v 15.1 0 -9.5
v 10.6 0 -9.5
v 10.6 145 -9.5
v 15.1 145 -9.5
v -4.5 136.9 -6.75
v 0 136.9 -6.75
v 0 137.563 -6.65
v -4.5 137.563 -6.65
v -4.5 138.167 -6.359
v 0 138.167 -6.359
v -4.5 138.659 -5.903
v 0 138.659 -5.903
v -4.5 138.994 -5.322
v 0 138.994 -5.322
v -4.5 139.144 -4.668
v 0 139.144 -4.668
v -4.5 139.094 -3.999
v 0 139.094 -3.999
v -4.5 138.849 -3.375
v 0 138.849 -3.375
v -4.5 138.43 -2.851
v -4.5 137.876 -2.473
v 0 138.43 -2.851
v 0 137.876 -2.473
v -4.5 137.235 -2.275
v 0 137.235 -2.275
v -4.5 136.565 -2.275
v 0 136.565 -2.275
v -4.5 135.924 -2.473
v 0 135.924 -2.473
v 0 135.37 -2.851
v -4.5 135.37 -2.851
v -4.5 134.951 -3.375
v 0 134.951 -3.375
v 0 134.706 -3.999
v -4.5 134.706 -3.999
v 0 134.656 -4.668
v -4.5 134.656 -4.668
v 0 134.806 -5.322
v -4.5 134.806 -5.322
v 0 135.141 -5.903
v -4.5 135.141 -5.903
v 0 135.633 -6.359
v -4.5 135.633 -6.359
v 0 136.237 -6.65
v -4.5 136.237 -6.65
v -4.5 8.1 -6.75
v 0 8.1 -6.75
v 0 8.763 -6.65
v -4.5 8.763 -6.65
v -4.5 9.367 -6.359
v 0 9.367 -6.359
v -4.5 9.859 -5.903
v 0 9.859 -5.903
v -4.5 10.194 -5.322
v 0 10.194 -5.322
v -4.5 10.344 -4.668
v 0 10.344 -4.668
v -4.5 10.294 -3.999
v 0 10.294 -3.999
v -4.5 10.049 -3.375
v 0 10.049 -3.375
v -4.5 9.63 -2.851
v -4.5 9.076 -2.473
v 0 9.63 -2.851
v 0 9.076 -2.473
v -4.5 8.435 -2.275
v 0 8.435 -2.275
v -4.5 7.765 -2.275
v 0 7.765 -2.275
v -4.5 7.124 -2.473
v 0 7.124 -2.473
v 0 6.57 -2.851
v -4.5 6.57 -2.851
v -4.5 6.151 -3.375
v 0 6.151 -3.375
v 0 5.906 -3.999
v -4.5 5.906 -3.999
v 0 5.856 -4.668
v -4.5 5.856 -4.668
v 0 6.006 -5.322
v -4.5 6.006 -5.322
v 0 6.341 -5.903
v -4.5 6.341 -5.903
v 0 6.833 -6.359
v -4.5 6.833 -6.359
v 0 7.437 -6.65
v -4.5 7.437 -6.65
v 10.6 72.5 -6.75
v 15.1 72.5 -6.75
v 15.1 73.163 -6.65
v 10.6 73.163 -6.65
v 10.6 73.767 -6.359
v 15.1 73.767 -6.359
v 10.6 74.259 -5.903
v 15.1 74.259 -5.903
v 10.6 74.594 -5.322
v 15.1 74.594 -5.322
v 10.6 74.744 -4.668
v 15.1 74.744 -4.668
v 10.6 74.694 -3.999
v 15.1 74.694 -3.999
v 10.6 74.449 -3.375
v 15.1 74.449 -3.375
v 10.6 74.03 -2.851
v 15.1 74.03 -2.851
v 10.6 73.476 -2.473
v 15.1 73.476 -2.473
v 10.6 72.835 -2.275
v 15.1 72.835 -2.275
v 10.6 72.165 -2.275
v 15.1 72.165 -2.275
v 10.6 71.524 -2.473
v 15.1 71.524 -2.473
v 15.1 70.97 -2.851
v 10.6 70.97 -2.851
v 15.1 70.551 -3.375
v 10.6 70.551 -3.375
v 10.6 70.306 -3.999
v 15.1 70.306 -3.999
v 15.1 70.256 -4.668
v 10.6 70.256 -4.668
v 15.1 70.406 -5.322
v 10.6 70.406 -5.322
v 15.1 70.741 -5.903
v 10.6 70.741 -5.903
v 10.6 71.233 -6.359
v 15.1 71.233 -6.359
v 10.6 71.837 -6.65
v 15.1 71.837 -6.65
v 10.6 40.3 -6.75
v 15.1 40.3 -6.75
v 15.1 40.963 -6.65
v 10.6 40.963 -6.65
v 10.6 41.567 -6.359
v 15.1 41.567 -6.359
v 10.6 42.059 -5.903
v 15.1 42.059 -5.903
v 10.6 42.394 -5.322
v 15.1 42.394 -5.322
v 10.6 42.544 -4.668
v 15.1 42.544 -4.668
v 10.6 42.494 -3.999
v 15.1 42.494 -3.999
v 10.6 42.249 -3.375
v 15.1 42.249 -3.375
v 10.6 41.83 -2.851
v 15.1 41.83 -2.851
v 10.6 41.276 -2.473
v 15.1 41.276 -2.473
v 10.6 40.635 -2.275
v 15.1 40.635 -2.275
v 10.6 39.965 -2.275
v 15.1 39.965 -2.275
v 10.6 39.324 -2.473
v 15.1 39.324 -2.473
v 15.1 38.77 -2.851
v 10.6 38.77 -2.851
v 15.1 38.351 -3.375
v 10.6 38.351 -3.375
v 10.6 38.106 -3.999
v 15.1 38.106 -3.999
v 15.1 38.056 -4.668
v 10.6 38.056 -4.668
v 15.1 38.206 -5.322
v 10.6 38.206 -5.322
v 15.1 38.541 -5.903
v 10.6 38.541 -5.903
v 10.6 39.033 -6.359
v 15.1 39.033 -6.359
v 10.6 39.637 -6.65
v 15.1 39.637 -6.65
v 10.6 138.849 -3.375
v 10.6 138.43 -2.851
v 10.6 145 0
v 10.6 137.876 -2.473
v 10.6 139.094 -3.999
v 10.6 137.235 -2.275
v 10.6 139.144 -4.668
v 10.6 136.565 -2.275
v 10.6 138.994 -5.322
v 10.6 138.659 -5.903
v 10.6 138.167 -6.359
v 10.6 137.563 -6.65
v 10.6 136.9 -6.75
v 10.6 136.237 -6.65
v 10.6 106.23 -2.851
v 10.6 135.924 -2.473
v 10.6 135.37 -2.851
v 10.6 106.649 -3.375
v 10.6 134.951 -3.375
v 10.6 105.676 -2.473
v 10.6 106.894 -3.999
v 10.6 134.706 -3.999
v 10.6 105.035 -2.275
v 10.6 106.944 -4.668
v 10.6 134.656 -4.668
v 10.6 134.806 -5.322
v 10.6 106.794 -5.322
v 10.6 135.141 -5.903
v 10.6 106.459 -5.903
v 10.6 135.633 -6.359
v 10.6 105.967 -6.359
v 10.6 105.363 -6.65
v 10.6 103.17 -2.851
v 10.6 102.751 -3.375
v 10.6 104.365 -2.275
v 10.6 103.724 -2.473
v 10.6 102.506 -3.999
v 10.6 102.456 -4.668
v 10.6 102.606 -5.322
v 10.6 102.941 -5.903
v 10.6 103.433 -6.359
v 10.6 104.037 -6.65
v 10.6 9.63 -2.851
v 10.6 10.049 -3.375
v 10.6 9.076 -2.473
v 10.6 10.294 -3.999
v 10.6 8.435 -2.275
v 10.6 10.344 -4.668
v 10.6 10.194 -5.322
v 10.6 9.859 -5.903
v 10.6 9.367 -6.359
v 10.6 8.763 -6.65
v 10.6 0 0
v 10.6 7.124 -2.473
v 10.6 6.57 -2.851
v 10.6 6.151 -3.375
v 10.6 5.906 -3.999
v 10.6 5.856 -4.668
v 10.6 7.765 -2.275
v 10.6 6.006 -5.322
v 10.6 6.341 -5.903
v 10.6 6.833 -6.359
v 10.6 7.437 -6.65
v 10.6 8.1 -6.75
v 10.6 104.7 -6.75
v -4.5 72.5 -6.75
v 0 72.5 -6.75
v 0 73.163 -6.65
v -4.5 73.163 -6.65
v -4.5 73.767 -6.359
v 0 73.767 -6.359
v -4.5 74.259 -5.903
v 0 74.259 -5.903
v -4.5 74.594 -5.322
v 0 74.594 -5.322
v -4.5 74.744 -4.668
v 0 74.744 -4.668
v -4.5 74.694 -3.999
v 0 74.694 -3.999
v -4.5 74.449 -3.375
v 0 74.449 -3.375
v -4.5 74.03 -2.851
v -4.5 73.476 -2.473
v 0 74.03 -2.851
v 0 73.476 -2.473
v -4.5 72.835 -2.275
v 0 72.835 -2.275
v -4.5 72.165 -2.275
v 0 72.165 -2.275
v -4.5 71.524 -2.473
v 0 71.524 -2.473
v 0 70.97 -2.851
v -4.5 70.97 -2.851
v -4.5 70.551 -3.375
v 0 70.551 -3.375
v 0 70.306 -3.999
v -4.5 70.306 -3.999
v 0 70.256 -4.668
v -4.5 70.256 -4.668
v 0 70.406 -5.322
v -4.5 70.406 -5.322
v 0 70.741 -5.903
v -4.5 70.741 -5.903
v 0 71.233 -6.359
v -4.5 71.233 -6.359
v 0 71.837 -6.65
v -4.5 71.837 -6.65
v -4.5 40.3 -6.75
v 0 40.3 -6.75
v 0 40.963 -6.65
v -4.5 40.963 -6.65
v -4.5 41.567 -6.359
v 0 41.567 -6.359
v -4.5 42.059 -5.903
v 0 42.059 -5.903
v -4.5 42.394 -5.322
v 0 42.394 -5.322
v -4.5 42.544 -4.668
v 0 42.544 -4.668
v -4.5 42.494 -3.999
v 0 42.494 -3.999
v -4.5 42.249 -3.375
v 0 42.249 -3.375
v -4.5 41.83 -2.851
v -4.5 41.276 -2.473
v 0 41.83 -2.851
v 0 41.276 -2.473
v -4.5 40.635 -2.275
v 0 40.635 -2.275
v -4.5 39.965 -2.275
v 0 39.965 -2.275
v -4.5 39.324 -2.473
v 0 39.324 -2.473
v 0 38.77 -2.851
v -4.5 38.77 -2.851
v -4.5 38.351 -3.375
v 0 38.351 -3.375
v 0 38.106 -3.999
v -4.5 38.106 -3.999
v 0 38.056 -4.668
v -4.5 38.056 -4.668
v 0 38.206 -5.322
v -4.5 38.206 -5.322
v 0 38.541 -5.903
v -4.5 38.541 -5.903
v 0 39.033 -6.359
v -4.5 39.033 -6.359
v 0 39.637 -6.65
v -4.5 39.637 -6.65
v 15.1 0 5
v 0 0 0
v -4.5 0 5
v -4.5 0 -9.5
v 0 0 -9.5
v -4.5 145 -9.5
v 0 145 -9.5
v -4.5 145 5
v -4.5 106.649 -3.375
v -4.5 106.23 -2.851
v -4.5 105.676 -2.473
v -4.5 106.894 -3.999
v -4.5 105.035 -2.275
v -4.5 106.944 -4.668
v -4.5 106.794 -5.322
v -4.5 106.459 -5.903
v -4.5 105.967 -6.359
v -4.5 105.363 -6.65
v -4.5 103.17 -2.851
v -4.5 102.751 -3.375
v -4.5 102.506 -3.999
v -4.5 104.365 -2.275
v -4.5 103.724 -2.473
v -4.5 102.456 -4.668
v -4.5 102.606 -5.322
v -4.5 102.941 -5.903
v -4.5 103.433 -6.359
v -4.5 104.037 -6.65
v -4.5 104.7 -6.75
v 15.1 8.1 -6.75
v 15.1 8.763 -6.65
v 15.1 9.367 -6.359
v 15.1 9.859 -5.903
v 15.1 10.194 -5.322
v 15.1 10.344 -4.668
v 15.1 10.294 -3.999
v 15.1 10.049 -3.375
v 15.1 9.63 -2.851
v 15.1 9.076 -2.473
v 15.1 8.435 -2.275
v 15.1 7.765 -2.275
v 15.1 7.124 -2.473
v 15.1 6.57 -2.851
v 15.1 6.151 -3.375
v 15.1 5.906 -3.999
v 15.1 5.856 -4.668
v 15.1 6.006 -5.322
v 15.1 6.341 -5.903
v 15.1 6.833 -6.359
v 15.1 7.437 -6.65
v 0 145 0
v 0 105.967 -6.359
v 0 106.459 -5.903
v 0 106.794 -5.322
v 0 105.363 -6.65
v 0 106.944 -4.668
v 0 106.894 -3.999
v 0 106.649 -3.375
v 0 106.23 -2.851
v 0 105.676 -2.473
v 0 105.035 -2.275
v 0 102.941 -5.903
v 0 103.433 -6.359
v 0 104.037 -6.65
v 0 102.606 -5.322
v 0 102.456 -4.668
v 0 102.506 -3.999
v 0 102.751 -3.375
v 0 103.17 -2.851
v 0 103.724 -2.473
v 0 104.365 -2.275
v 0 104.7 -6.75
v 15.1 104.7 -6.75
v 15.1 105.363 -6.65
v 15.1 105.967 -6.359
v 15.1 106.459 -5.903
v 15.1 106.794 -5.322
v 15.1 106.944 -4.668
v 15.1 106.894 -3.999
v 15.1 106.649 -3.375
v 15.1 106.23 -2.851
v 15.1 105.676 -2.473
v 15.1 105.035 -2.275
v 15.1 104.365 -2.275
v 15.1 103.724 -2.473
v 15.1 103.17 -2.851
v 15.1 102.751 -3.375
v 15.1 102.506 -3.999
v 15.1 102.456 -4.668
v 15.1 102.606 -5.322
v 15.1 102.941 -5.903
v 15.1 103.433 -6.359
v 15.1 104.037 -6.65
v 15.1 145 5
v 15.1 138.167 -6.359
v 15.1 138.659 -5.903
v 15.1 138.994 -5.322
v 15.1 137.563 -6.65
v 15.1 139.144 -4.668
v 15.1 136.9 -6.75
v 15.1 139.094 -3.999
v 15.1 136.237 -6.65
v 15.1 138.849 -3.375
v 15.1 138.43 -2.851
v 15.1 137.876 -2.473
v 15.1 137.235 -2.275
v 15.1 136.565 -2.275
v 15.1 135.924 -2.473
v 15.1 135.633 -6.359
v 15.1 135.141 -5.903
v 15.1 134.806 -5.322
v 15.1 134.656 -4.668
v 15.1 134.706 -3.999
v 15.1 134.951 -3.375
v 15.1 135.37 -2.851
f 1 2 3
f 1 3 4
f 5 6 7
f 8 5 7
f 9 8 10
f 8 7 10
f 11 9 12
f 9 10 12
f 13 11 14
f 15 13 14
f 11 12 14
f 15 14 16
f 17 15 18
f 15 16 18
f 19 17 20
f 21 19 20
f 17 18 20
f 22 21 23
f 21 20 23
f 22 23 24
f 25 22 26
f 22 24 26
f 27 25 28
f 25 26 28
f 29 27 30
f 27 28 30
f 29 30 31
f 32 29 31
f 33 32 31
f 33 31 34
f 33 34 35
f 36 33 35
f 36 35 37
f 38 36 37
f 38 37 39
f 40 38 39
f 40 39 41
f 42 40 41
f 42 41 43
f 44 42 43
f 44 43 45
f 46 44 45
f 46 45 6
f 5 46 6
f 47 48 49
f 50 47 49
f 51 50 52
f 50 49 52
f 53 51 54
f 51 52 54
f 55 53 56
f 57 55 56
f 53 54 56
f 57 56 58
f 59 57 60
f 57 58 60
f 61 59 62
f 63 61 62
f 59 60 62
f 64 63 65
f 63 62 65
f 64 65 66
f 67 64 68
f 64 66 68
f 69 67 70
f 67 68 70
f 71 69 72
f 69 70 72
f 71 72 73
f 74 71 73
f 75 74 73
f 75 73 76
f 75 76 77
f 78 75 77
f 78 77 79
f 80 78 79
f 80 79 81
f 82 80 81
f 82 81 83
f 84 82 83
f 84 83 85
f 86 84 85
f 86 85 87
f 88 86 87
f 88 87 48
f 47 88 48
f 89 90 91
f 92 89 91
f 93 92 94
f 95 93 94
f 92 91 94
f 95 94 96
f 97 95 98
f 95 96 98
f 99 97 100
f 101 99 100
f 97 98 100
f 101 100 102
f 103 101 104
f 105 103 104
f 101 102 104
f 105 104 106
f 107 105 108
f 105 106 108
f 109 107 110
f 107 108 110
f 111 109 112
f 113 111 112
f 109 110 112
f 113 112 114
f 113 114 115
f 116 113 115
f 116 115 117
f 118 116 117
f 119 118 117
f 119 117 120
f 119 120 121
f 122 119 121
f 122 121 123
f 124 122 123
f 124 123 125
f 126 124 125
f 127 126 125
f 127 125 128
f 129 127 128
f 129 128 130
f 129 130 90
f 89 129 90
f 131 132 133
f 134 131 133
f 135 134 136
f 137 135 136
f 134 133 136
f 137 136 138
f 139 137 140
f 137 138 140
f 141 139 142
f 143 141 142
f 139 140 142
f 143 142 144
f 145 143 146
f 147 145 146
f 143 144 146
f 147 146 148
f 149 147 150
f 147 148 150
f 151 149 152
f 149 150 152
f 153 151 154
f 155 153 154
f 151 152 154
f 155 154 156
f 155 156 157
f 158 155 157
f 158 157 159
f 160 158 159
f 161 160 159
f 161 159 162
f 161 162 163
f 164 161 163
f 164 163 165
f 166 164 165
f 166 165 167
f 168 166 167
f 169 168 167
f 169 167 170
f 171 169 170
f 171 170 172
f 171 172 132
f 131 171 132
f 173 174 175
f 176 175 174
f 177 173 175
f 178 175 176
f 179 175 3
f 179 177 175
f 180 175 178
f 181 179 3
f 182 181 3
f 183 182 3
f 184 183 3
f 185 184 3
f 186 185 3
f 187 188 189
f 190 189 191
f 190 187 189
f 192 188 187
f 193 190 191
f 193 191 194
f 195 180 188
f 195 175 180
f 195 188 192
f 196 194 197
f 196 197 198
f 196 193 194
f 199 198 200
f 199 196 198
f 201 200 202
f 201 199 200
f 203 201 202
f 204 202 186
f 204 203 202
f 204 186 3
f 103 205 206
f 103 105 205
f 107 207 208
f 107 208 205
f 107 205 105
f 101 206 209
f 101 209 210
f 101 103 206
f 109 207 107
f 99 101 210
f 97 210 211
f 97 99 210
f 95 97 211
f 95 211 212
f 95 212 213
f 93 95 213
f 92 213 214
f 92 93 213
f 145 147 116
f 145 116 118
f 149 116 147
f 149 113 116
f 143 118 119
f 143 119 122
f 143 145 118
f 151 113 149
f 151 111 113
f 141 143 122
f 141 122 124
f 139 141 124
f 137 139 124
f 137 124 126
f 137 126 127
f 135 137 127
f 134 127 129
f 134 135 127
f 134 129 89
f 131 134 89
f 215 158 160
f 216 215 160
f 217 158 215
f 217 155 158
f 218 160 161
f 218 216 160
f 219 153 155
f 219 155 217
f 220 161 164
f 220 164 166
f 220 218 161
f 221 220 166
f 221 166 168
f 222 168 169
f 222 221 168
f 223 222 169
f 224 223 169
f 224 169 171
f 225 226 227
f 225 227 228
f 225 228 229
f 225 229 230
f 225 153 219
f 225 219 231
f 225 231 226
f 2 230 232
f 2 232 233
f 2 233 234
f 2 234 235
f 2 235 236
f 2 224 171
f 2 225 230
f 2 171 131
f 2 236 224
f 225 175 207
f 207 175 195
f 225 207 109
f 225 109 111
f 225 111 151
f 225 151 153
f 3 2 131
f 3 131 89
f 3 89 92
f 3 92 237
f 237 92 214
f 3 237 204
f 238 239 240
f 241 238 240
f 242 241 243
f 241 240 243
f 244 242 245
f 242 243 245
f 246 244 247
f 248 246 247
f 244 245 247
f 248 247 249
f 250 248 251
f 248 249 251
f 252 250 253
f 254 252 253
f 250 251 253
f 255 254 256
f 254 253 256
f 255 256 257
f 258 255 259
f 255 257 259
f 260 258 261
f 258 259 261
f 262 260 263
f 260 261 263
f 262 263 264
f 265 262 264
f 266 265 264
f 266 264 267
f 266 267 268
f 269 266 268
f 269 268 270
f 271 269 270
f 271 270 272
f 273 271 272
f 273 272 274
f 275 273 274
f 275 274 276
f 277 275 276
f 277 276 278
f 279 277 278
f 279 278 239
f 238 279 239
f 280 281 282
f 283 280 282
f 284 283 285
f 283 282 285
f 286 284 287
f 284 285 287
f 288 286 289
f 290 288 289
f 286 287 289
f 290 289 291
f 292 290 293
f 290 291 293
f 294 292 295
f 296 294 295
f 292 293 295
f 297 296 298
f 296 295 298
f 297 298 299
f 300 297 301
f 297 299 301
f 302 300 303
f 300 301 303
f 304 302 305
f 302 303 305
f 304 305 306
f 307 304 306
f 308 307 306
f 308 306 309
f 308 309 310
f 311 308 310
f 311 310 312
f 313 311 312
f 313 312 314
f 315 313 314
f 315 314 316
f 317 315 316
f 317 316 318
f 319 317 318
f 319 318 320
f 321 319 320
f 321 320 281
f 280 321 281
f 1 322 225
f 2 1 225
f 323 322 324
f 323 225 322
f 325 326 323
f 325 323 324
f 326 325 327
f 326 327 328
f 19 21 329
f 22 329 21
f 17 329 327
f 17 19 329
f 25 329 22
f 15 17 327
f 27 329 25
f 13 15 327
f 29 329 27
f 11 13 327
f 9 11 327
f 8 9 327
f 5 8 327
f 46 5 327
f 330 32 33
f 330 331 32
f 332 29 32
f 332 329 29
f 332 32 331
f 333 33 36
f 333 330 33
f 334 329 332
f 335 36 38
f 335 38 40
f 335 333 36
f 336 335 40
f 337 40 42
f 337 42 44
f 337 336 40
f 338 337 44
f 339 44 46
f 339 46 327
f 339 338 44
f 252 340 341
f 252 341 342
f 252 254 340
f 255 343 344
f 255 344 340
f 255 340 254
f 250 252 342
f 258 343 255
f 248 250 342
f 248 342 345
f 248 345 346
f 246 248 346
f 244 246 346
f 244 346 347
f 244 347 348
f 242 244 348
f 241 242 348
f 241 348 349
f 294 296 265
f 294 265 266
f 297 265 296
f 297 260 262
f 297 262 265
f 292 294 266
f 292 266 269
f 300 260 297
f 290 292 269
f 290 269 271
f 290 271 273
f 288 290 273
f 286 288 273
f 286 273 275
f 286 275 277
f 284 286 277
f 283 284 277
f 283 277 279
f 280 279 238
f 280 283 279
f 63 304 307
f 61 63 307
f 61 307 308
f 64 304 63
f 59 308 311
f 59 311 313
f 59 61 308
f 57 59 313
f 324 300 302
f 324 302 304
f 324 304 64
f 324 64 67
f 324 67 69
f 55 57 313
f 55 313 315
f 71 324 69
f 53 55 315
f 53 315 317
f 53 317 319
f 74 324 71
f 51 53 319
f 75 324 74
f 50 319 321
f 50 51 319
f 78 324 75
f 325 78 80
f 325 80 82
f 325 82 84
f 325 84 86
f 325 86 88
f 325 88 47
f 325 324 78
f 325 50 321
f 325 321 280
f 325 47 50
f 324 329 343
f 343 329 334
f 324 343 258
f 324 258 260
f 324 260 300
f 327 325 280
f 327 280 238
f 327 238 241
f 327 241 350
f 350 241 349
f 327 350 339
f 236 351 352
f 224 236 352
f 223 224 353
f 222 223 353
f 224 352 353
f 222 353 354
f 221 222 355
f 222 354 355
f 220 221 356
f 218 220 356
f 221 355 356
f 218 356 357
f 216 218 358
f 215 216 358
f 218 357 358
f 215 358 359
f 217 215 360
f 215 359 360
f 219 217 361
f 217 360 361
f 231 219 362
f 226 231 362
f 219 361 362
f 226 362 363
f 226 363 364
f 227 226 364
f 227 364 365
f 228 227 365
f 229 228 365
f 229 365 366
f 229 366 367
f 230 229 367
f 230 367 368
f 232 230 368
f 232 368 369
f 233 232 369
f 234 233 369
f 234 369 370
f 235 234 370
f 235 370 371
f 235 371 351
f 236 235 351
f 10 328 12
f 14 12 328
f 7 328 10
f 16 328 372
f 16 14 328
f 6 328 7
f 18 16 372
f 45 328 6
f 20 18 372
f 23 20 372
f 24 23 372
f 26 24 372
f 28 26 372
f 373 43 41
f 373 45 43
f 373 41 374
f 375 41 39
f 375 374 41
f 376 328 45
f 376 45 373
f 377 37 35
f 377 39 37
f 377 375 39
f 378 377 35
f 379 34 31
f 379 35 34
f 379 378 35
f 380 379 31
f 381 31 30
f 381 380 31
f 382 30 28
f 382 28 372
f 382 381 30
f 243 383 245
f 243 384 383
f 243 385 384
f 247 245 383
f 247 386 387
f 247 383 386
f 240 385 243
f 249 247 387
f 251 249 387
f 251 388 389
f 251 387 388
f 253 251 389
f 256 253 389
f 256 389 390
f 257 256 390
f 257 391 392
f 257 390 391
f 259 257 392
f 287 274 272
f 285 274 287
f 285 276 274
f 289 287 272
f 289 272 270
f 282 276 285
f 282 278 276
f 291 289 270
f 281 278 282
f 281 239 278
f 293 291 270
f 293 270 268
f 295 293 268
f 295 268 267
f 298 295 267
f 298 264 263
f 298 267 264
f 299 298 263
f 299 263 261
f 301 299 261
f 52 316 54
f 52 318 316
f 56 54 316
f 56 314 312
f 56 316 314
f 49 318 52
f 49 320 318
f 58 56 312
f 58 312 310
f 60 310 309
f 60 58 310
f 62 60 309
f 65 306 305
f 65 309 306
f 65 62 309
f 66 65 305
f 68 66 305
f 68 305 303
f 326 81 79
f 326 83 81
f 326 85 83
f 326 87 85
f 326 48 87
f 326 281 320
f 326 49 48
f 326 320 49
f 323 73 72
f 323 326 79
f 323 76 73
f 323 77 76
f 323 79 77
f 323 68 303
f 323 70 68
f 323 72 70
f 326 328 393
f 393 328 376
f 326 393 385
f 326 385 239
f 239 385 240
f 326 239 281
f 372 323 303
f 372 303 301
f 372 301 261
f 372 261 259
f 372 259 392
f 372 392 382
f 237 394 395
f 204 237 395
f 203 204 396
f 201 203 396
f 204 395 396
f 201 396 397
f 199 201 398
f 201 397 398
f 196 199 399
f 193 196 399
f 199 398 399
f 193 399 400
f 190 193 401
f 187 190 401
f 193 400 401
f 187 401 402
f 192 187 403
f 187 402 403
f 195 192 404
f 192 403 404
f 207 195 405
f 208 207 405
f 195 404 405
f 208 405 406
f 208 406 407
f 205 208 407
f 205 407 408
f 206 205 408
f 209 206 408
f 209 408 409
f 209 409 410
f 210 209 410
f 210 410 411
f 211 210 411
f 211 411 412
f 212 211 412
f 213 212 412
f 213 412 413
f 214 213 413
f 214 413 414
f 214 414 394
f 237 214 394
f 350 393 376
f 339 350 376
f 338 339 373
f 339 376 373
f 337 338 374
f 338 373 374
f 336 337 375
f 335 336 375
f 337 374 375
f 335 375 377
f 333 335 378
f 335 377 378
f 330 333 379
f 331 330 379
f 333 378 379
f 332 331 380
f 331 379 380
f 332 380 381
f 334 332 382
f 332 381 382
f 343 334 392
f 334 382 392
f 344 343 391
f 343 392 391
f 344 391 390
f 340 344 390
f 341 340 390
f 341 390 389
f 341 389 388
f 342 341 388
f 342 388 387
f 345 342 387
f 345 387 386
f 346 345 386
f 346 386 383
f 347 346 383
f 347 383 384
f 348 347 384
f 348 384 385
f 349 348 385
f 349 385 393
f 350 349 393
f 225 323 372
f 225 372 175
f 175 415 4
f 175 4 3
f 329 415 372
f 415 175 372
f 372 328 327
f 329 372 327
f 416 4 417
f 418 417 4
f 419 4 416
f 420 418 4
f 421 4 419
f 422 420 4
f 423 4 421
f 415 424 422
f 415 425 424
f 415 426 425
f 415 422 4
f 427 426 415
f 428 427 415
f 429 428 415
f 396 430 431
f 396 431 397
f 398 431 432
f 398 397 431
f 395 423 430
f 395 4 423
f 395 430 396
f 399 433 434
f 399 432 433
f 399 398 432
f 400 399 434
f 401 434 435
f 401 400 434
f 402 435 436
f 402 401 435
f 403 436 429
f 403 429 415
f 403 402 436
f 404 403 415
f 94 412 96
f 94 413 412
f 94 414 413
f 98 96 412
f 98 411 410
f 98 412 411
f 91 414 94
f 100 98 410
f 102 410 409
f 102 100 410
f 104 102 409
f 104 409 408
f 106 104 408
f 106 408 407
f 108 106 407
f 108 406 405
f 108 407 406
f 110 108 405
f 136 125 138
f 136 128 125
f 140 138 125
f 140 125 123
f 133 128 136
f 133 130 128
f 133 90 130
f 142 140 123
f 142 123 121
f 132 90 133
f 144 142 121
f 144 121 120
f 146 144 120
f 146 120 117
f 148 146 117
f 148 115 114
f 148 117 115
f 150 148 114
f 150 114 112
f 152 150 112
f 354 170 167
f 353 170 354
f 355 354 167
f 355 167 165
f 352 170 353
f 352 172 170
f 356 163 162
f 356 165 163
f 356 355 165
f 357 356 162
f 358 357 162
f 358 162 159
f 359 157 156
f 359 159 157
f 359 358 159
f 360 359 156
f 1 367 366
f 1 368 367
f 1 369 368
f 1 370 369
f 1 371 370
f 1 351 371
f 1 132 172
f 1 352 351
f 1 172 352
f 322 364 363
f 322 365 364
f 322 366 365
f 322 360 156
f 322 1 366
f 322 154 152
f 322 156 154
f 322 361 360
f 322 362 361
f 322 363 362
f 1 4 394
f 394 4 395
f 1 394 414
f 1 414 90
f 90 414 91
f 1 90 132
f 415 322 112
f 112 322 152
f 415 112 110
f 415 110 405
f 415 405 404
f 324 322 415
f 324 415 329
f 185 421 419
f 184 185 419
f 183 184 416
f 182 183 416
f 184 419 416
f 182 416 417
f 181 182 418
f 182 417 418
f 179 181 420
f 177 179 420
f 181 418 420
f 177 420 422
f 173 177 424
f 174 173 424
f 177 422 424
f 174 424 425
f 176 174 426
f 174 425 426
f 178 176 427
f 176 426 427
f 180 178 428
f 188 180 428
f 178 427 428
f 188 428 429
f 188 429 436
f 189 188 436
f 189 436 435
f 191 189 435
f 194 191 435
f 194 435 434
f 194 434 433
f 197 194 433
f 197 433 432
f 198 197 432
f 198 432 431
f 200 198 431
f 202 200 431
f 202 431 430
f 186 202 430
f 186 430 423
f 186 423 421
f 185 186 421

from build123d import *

# Parameters (mm, degrees)
EXTRUDE_1_DEPTH     = 145
SKETCH_2_R          = 2.25
CUT_EXTRUDE_1_DEPTH = 147.626771089


with BuildPart() as part:
    # Эскиз1 → Бобышка-Вытянуть1 (new body)
    with BuildSketch(Plane(origin=(0, 0, 0), x_dir=(1, 0, 0), z_dir=(0, 1, 0))):
        Polygon((0, 0), (10.6, 0), (10.6, 9.5), (15.1, 9.5), (15.1, -5), (-4.5, -5), (-4.5, 9.5), (0, 9.5), align=None)
    extrude(amount=EXTRUDE_1_DEPTH)

    # Эскиз2 → Вырез-Вытянуть1 (cut, through all)
    with BuildSketch(Plane(origin=(15.1, 0, 0), x_dir=(0, 0, -1), z_dir=(1, 0, 0))):
        with Locations((4.5, 40.3)):
            Circle(SKETCH_2_R)
        with Locations((4.5, 8.1)):
            Circle(SKETCH_2_R)
        with Locations((4.5, 72.5)):
            Circle(SKETCH_2_R)
        with Locations((4.5, 104.7)):
            Circle(SKETCH_2_R)
        with Locations((4.5, 136.9)):
            Circle(SKETCH_2_R)
    extrude(amount=-CUT_EXTRUDE_1_DEPTH, mode=Mode.SUBTRACT)


solid = part.part
